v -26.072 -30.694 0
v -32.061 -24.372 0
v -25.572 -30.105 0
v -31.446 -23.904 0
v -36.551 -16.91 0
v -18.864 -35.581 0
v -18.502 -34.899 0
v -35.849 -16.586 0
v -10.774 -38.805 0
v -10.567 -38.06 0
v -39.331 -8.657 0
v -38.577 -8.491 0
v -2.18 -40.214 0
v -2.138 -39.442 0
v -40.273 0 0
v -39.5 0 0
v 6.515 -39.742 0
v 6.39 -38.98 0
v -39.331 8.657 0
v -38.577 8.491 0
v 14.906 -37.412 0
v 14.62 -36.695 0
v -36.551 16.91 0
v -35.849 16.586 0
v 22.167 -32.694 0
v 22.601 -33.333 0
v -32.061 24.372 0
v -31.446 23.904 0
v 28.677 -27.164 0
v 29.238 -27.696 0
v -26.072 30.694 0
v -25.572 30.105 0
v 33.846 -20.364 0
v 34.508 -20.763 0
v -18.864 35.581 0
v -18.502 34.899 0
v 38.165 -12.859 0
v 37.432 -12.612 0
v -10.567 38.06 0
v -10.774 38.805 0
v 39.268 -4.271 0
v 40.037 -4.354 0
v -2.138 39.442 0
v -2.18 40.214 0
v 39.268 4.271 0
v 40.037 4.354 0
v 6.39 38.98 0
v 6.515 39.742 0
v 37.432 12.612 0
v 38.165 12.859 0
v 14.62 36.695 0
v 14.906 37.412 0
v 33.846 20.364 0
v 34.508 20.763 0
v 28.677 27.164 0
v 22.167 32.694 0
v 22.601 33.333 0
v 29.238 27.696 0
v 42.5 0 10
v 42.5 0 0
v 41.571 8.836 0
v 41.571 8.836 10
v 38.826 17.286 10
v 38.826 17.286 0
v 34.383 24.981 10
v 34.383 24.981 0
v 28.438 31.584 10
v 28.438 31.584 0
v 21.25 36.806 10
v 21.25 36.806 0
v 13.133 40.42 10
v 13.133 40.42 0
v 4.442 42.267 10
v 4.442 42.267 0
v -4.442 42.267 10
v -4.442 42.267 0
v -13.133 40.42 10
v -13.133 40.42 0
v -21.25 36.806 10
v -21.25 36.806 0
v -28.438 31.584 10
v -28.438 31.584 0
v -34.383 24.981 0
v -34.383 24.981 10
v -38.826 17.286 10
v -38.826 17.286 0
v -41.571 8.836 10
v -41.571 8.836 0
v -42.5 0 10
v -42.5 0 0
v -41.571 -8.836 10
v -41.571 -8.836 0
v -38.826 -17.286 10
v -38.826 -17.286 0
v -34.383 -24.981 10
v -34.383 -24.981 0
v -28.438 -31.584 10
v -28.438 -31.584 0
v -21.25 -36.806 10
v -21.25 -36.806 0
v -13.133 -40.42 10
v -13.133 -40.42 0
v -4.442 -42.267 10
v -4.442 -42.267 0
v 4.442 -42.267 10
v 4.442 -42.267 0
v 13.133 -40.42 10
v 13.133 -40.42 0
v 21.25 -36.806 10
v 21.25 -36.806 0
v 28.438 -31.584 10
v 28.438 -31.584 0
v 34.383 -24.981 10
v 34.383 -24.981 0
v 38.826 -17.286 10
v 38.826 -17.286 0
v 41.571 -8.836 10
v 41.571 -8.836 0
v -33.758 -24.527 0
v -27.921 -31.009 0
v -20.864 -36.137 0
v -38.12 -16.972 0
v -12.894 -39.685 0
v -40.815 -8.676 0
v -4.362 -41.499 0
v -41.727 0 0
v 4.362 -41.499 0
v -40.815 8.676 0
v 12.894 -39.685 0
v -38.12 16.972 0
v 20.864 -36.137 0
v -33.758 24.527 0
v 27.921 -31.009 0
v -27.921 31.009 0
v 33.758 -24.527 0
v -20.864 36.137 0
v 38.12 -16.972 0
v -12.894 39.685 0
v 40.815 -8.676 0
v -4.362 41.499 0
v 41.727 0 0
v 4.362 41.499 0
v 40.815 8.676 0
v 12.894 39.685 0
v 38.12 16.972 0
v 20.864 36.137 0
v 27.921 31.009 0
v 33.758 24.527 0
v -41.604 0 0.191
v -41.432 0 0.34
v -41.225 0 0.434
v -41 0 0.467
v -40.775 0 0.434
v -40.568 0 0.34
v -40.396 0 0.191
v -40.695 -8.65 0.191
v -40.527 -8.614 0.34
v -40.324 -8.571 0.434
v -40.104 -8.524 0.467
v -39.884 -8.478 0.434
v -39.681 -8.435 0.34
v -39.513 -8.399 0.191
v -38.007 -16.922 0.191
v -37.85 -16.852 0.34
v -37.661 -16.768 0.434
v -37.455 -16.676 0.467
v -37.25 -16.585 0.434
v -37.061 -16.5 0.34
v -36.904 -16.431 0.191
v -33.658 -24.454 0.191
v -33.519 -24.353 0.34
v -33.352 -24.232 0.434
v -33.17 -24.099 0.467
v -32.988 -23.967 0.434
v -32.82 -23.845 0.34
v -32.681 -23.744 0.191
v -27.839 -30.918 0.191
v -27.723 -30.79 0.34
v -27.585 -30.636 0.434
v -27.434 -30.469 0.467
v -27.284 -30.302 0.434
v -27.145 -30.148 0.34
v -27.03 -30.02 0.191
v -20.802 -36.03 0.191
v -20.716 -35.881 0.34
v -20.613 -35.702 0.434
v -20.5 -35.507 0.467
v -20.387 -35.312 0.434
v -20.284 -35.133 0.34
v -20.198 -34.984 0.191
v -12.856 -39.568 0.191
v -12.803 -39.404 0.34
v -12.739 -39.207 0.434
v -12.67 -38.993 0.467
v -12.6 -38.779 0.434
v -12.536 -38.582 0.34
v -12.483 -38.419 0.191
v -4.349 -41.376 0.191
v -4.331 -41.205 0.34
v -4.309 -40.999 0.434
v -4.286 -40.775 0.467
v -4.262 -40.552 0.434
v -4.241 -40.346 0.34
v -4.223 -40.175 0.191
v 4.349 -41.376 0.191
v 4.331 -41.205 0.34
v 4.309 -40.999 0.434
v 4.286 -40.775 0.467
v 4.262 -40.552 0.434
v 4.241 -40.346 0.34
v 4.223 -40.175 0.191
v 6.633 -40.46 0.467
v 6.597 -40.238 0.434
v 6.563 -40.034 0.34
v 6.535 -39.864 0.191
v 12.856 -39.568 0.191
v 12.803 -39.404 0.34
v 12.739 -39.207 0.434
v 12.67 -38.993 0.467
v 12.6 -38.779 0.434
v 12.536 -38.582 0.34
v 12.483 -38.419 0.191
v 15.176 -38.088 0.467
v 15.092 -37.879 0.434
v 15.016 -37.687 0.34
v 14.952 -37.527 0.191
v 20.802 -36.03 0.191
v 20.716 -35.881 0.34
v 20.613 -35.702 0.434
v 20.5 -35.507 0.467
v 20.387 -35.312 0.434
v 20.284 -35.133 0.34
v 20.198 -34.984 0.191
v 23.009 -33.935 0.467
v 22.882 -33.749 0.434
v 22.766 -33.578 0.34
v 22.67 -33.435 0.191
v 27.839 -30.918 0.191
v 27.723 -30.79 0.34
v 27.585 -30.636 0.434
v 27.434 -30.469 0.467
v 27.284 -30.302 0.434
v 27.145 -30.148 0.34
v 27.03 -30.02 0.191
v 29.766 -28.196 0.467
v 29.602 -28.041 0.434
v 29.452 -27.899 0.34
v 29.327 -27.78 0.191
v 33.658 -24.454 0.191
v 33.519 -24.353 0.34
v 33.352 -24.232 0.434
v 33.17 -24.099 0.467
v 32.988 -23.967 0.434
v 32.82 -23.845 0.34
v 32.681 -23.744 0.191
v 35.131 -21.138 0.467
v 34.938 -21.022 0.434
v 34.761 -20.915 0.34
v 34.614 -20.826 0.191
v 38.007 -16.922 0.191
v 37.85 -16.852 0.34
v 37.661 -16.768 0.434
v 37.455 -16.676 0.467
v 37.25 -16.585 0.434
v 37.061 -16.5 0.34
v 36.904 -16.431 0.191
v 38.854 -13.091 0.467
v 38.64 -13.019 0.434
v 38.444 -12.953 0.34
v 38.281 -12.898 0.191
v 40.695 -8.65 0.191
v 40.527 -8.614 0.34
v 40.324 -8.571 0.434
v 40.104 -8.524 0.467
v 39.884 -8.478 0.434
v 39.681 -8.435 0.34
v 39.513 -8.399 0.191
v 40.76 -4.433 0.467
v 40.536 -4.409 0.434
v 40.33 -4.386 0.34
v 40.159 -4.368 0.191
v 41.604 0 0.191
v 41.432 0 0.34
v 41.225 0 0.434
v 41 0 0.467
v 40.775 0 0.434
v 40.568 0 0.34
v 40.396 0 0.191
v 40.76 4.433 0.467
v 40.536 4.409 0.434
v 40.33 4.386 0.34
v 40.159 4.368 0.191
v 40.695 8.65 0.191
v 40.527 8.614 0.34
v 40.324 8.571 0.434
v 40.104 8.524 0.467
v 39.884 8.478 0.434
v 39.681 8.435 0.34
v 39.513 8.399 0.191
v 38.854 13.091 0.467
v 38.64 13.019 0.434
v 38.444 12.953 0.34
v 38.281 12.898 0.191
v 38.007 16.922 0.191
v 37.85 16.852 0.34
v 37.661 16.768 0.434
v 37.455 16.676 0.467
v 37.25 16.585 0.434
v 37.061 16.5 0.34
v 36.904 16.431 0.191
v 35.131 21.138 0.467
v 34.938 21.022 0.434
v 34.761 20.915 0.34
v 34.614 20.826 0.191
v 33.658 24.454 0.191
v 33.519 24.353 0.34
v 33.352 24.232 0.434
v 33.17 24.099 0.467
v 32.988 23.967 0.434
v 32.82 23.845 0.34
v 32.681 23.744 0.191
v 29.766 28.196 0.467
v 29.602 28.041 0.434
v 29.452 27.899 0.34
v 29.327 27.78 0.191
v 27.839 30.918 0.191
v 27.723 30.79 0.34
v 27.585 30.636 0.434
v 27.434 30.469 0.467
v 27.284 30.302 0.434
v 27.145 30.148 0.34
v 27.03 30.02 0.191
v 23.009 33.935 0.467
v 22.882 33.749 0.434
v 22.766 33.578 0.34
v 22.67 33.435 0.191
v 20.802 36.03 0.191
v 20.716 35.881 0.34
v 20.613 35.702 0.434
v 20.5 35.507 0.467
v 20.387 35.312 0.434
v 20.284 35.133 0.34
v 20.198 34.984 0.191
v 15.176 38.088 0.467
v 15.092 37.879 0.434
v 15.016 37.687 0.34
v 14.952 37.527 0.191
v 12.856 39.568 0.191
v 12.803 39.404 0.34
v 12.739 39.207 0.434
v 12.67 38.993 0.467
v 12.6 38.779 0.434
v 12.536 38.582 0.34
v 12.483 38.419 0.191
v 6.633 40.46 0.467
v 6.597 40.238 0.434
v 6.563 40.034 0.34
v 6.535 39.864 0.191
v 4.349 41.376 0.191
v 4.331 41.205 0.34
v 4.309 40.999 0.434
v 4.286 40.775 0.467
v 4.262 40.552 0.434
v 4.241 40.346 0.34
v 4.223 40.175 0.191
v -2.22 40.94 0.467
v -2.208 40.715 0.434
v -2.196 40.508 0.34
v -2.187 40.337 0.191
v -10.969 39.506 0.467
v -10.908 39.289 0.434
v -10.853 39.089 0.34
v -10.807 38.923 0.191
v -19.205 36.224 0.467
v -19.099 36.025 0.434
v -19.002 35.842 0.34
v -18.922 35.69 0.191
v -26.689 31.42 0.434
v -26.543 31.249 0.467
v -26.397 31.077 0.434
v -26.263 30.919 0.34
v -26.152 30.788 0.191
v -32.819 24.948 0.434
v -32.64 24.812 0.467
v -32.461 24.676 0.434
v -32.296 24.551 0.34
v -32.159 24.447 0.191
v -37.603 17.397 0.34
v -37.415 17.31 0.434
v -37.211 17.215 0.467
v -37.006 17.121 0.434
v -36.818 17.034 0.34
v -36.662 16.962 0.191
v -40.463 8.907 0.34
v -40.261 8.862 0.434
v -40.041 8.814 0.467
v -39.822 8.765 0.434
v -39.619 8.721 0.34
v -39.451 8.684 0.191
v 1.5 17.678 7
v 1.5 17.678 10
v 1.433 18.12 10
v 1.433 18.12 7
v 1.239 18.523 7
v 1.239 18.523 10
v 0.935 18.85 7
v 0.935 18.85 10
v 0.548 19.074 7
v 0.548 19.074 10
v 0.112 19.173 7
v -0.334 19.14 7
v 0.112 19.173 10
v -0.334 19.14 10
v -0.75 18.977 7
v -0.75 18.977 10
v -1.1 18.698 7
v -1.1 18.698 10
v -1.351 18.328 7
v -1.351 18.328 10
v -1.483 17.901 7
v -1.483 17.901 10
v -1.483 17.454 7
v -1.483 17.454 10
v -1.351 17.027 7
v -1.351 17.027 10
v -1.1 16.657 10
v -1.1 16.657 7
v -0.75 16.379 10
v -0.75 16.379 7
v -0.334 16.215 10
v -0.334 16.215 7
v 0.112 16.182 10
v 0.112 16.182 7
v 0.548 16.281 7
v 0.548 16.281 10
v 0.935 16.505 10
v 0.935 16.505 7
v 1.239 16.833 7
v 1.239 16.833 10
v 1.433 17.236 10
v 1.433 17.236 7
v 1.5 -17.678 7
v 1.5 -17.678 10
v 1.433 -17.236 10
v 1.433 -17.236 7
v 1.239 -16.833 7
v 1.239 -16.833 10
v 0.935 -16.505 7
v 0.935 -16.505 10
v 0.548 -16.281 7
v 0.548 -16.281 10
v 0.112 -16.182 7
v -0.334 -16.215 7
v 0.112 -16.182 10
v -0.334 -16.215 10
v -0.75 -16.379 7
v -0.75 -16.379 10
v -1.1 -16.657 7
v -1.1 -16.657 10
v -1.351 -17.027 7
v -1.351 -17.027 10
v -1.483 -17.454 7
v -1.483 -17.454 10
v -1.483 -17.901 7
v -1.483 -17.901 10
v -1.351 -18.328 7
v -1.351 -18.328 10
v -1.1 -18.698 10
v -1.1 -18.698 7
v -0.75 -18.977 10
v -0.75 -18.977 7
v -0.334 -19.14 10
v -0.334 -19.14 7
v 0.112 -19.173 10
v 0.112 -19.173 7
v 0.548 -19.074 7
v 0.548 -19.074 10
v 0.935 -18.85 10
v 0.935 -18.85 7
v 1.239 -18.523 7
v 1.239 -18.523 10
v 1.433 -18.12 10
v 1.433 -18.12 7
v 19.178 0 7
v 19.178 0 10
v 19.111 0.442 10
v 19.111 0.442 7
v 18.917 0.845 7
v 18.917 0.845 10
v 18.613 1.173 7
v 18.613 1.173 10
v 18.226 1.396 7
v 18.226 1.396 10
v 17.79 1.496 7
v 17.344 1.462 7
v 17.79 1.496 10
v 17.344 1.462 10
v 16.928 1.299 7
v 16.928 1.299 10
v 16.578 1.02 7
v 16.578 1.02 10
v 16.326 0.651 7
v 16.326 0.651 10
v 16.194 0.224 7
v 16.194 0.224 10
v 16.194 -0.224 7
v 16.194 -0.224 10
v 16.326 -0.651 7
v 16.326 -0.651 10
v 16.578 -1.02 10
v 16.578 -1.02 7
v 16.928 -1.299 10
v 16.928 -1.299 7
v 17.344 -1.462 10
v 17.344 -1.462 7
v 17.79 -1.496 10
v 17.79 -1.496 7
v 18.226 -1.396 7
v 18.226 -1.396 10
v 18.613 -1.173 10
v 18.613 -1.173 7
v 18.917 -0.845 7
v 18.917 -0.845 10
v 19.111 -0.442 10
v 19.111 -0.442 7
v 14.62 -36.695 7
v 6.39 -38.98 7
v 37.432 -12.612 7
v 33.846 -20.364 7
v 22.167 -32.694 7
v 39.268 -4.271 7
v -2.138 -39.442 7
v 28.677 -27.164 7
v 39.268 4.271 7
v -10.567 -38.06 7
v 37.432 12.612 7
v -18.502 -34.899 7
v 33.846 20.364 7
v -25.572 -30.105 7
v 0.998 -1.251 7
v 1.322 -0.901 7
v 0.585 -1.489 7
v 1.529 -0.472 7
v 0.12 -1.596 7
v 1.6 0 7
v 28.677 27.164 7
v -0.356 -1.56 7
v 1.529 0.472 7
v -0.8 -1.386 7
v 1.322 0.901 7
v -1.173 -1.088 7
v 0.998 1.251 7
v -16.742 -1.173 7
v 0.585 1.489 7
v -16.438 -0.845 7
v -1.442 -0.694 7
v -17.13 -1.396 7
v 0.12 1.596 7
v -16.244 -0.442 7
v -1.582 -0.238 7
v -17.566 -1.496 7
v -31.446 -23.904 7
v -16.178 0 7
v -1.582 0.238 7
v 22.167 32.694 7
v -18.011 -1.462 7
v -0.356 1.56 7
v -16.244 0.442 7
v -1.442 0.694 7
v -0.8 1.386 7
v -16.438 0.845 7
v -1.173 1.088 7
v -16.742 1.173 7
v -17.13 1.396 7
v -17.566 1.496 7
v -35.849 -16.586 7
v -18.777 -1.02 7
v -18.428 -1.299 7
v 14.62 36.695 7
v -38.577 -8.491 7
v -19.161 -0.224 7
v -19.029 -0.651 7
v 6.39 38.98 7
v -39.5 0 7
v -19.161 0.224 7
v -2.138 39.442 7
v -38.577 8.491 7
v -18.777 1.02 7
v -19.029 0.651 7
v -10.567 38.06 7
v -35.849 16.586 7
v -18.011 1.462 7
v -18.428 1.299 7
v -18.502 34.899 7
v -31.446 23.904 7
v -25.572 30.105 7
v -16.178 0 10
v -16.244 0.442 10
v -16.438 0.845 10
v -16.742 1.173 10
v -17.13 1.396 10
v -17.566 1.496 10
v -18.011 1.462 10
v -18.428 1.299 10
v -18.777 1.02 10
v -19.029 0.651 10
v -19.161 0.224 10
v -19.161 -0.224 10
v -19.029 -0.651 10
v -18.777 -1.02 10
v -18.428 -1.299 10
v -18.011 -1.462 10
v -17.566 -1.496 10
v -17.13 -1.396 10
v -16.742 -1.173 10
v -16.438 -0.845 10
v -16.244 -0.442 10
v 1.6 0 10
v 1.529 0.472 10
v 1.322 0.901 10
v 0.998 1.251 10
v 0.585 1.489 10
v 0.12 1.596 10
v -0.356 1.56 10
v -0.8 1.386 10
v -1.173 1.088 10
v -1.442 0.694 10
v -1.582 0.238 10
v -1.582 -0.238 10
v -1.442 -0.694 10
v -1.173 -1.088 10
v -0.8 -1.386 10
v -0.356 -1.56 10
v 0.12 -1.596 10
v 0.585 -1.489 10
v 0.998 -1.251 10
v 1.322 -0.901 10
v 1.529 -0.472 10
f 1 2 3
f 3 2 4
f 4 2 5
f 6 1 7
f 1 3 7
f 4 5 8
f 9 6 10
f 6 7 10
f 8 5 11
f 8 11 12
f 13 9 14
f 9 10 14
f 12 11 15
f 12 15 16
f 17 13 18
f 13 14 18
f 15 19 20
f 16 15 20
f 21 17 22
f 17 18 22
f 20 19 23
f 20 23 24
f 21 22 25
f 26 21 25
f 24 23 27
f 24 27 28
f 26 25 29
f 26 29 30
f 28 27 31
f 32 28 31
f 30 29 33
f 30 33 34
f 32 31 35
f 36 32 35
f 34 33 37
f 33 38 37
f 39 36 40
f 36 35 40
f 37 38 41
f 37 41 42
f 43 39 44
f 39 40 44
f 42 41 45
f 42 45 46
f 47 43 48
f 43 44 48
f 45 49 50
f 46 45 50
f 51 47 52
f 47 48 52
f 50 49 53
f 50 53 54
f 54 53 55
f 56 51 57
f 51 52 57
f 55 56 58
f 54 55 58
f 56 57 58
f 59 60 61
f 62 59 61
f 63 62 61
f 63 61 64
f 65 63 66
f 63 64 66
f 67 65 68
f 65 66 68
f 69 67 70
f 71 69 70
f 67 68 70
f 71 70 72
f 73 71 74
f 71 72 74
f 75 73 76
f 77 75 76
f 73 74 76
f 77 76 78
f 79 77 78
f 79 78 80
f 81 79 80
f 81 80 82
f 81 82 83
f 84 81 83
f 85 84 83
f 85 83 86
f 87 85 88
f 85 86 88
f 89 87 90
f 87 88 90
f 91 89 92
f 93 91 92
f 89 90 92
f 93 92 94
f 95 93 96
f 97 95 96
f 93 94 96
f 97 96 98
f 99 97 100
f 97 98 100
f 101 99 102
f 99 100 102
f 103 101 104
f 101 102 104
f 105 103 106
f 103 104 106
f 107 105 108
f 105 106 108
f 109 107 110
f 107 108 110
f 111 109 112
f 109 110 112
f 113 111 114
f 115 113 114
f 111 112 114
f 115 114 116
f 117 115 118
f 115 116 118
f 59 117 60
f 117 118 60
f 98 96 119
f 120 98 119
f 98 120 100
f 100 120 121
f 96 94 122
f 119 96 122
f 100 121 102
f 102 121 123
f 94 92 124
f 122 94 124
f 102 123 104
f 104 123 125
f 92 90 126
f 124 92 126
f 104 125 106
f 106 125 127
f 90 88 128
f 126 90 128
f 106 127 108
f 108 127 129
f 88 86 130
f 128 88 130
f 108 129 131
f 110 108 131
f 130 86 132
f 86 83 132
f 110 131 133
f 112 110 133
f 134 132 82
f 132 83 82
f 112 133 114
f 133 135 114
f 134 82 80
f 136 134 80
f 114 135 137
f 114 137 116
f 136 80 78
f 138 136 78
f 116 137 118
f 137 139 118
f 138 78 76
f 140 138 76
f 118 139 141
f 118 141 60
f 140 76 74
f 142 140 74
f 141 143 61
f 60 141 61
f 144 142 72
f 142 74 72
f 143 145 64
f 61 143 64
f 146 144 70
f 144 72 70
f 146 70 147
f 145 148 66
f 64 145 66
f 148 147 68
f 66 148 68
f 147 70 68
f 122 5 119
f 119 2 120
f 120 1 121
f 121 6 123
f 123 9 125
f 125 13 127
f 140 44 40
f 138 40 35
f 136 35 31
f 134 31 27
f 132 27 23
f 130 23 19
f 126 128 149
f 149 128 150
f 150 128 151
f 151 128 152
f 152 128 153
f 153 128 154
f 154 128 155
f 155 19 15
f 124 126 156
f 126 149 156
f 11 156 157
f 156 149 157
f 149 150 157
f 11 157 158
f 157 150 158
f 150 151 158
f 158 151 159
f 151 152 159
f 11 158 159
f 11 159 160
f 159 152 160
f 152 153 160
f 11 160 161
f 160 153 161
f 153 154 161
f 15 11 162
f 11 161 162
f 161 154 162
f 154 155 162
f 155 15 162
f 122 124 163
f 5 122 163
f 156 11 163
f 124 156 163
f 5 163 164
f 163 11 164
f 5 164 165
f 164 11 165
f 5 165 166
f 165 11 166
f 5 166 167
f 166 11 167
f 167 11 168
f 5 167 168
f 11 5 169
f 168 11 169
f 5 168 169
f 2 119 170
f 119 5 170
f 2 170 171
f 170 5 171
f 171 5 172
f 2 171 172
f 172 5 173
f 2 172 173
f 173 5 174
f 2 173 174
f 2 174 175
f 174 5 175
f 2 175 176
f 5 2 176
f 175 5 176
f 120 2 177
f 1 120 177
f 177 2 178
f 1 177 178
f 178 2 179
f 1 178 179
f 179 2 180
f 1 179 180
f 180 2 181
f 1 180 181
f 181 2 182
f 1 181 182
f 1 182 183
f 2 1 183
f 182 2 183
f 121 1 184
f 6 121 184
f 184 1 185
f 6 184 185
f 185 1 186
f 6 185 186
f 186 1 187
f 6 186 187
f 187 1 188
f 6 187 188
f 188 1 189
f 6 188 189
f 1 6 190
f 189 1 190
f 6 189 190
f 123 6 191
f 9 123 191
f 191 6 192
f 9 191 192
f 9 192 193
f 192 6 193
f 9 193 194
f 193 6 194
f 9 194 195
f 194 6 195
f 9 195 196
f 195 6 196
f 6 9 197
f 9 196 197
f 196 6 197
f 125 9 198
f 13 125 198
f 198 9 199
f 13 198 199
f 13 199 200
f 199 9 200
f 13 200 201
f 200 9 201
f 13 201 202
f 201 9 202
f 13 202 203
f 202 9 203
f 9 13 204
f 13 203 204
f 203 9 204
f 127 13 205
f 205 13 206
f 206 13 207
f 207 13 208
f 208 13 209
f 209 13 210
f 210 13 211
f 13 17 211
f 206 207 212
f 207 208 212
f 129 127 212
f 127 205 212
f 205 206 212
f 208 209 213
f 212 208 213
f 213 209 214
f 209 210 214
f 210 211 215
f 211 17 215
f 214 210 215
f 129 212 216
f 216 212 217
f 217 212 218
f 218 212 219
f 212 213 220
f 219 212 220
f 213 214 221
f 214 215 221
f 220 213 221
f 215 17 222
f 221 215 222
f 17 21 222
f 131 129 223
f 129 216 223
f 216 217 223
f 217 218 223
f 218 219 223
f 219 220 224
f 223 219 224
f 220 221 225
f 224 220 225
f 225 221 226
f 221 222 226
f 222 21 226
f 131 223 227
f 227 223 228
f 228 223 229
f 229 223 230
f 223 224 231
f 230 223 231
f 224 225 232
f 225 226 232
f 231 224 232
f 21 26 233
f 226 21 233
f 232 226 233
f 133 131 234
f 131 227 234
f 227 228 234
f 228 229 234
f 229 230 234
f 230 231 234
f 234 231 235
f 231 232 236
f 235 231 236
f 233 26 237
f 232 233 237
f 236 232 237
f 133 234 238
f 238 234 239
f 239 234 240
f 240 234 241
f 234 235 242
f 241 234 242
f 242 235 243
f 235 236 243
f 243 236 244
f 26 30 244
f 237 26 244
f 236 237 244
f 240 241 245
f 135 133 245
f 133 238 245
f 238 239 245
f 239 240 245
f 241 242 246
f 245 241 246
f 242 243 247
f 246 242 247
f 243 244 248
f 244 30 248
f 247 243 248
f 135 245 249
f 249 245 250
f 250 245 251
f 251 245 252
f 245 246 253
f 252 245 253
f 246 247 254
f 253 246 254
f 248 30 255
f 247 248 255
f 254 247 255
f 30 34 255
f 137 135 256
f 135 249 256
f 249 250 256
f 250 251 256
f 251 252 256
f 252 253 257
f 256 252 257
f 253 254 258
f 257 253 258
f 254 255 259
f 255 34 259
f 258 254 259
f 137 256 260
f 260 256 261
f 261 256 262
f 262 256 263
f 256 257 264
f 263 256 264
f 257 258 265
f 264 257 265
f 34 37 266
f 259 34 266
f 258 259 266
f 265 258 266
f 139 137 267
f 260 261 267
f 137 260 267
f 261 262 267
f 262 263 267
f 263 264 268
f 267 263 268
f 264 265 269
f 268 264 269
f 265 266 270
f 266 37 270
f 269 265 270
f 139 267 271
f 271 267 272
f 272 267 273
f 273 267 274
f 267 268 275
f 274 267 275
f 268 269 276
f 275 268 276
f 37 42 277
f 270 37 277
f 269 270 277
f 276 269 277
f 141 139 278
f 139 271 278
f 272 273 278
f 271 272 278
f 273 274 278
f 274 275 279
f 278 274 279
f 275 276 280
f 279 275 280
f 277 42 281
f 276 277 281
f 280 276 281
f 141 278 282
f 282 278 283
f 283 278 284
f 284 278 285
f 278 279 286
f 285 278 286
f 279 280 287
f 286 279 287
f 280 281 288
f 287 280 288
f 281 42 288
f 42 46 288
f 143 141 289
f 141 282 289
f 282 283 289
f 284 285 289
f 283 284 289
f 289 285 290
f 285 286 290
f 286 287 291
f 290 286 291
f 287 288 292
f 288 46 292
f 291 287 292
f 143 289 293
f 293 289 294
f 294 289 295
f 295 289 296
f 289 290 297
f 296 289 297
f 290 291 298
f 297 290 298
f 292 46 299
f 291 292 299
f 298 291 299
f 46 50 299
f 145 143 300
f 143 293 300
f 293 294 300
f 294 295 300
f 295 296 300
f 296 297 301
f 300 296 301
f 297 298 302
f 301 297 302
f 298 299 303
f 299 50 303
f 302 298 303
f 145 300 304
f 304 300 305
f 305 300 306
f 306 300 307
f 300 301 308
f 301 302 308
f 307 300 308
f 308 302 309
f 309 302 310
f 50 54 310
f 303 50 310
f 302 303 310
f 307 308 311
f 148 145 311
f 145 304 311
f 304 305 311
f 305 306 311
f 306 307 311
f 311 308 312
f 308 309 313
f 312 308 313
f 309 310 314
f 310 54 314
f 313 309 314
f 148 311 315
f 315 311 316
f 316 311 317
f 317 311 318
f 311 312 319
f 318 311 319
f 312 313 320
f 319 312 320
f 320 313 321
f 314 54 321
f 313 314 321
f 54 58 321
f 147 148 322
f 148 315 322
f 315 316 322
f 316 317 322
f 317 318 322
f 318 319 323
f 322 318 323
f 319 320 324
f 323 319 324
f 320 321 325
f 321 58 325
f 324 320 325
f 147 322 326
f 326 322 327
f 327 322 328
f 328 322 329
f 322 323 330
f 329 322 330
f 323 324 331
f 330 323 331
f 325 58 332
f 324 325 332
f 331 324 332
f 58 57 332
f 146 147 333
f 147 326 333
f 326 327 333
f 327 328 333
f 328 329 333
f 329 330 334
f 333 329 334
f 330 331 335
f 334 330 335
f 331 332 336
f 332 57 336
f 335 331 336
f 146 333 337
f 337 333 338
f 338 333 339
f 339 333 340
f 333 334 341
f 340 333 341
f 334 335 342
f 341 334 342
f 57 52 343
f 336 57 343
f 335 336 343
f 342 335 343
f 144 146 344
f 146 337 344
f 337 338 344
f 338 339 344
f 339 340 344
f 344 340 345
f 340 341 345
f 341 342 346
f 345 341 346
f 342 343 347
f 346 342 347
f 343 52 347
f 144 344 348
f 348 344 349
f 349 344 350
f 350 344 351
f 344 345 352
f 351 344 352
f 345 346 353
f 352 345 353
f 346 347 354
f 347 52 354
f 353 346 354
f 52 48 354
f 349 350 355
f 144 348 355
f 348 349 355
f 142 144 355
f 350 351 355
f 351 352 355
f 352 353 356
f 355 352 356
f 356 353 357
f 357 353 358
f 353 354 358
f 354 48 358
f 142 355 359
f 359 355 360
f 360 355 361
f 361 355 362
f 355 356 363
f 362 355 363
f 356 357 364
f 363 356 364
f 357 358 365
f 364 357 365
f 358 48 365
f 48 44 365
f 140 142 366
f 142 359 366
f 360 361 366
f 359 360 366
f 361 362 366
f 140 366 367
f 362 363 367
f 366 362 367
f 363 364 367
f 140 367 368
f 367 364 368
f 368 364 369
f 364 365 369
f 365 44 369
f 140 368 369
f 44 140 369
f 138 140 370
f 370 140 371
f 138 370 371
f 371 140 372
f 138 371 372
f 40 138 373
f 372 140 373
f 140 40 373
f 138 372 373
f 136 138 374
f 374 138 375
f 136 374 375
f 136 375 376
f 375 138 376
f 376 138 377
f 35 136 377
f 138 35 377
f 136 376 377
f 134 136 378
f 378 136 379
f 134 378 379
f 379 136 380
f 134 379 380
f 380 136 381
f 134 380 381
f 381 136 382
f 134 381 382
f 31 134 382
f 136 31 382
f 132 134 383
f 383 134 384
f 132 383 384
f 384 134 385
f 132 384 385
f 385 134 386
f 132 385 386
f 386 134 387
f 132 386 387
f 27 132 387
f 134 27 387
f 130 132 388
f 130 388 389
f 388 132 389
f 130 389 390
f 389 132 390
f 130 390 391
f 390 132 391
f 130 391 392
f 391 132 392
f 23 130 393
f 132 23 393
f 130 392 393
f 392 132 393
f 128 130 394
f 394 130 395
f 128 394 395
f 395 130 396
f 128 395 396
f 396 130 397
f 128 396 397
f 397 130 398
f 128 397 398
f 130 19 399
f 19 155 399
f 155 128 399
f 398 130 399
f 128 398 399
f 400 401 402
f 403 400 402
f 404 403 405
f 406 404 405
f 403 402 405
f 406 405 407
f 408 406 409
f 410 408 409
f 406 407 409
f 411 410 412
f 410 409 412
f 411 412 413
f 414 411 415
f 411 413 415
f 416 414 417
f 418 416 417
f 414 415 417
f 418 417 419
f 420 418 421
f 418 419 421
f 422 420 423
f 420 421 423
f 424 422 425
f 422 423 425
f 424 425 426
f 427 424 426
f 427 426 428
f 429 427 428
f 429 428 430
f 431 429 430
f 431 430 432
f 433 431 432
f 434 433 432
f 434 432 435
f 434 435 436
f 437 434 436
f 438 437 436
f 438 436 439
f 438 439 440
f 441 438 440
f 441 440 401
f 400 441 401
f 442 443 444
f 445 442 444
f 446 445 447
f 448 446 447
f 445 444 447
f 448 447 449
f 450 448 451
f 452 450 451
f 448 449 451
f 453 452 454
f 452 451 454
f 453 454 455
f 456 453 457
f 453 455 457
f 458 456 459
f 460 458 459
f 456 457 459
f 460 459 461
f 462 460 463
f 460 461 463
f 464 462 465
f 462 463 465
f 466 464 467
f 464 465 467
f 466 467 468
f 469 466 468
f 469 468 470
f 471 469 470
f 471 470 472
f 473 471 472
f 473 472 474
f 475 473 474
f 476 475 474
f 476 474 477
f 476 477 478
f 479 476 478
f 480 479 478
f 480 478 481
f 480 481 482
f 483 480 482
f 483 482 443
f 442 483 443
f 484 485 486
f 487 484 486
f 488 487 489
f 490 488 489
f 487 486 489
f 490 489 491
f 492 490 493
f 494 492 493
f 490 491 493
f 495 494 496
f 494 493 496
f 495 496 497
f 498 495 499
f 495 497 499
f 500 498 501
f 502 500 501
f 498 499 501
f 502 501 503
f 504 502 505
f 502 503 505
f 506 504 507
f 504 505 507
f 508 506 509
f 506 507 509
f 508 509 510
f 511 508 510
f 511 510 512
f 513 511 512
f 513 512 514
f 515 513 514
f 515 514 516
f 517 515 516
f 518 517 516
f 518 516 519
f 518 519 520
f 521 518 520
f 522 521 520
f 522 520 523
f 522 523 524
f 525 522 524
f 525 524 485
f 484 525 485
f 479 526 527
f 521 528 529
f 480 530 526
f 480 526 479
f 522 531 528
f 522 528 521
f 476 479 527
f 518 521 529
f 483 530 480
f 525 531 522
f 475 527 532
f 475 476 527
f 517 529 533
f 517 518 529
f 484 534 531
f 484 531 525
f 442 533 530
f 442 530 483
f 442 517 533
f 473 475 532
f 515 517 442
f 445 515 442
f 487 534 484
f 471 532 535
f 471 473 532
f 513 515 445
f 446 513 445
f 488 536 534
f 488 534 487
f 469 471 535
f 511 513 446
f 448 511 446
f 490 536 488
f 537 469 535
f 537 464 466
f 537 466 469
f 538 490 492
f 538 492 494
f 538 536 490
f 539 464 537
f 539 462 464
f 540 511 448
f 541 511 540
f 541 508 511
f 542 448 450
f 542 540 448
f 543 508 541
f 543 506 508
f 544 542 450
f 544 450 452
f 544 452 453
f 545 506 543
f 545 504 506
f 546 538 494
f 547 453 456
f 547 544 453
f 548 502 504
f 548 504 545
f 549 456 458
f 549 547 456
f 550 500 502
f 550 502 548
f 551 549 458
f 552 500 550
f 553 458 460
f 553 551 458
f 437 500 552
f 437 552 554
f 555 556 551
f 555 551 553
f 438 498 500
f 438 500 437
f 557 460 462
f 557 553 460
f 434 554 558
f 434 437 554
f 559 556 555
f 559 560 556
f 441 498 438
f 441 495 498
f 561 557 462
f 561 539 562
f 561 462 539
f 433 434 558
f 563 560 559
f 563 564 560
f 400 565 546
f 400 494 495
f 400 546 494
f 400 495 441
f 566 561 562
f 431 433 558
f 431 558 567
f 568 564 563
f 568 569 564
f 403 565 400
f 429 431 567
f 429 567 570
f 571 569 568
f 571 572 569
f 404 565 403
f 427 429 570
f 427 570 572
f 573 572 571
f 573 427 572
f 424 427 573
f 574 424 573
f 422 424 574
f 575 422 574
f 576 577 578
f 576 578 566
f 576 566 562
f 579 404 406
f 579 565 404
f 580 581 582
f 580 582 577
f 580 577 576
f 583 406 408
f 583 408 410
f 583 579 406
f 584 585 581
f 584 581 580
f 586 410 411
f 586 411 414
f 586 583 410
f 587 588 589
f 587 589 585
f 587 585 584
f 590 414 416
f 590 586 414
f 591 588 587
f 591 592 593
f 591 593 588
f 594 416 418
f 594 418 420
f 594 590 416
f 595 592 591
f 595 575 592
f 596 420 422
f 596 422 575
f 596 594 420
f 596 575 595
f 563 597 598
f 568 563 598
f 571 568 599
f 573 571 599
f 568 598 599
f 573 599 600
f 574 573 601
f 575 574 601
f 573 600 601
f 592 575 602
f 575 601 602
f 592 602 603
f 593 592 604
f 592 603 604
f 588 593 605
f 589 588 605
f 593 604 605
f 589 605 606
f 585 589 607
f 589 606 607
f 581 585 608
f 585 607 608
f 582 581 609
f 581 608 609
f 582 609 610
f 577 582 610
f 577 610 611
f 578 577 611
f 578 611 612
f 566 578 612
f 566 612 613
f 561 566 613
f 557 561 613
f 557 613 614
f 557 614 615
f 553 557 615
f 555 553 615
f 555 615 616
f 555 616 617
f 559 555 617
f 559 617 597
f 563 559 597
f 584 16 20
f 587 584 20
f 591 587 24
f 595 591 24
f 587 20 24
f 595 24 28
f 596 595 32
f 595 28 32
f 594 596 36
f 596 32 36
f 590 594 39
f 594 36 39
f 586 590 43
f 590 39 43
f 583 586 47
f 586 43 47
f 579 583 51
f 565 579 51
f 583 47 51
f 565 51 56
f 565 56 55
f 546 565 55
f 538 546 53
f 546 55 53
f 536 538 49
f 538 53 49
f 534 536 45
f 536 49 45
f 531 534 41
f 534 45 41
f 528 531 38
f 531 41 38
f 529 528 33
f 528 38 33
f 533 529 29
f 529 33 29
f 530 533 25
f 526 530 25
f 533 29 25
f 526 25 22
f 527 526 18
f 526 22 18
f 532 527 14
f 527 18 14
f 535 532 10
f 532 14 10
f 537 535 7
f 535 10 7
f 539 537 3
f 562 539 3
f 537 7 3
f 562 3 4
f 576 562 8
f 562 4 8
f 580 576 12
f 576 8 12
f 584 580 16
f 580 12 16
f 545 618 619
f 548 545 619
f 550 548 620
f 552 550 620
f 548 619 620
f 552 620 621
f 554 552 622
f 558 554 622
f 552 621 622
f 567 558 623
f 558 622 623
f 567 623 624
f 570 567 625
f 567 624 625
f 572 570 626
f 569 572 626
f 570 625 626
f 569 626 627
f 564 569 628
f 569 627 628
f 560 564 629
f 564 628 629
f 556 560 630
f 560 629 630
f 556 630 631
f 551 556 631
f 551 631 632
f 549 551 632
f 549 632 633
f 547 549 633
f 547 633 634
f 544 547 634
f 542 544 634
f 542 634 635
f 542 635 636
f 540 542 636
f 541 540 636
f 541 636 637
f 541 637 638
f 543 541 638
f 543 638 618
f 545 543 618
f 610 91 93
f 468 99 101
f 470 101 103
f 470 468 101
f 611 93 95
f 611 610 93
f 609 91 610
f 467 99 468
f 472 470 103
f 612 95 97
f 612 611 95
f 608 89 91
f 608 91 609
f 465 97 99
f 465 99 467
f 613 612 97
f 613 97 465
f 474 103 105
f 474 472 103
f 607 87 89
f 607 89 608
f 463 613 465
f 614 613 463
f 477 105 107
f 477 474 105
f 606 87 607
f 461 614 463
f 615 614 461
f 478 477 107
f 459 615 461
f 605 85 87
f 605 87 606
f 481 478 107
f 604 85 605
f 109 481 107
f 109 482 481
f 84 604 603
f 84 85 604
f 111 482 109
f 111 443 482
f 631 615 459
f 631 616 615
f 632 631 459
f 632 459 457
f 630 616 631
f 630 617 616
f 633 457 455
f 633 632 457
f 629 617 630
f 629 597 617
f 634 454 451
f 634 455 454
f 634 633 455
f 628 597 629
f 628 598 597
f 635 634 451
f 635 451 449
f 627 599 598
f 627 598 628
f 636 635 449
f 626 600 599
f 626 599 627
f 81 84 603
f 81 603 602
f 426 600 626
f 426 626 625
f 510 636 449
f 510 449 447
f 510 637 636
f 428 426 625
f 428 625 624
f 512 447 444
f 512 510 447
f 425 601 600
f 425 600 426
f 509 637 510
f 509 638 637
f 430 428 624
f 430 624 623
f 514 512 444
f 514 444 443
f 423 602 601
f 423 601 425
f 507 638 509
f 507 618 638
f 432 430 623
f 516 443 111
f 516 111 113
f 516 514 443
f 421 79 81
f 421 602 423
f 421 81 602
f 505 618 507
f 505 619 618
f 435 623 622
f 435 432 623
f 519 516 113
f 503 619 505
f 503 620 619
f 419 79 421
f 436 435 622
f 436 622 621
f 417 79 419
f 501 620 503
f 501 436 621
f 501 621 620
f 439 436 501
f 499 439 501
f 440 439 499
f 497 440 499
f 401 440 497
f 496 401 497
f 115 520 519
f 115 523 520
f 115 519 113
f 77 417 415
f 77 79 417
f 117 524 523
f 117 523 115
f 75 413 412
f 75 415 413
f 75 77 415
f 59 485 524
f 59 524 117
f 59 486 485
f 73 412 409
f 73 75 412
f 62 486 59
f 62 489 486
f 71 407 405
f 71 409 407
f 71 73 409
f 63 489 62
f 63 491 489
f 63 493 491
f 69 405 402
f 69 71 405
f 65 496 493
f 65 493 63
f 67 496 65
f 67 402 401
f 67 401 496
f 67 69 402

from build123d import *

# Parameters (mm, degrees)
SKETCH_1_R          = 42.5
EXTRUDE_1_DEPTH     = 10
SKETCH_2_R          = 39.5
CUT_EXTRUDE_1_DEPTH = 7
SKETCH_4_R          = 1.5
SKETCH_4_R_2        = 1.6
CUT_EXTRUDE_2_DEPTH = 61.930288035


with BuildPart() as part:
    # 草图1 → 凸台-拉伸1 (new body)
    with BuildSketch(Plane.XY):
        Circle(SKETCH_1_R)
    extrude(amount=EXTRUDE_1_DEPTH)

    # 草图2 → 切除-拉伸1 (cut)
    with BuildSketch(Plane(origin=(0, 0, 0), x_dir=(-1, 0, 0), z_dir=(0, 0, -1))):
        Circle(SKETCH_2_R)
    extrude(amount=-CUT_EXTRUDE_1_DEPTH, mode=Mode.SUBTRACT)

    # 草图4 → 切除-拉伸2 (cut, through all)
    with BuildSketch(Plane.XY.offset(10)):
        with Locations((0, 17.67766953)):
            Circle(SKETCH_4_R)
        with Locations((17.67766953, 0)):
            Circle(SKETCH_4_R)
        with Locations((0, -17.67766953)):
            Circle(SKETCH_4_R)
        with Locations((-17.67766953, 0)):
            Circle(SKETCH_4_R)
        Circle(SKETCH_4_R_2)
    extrude(amount=-CUT_EXTRUDE_2_DEPTH, mode=Mode.SUBTRACT)

    # 草图5 → 切除-旋转1 (revolve, cut)
    with BuildSketch(Plane(origin=(0, 0, 0), x_dir=(1, 0, 0), z_dir=(0, 1, 0)), mode=Mode.PRIVATE) as cut_revolve_1_sk:
        with BuildLine():
            Line((40.272743429, 0), (41.727256571, 0))
            ThreePointArc((41.727256571, 0), (41, -0.466686515), (40.272743429, 0))
        make_face()
    revolve(cut_revolve_1_sk.sketch.rotate(Axis((0, 0, -35.110243207), (0, 0, 1)), 180), axis=Axis((0, 0, -35.110243207), (0, 0, 1)), mode=Mode.SUBTRACT)


solid = part.part
